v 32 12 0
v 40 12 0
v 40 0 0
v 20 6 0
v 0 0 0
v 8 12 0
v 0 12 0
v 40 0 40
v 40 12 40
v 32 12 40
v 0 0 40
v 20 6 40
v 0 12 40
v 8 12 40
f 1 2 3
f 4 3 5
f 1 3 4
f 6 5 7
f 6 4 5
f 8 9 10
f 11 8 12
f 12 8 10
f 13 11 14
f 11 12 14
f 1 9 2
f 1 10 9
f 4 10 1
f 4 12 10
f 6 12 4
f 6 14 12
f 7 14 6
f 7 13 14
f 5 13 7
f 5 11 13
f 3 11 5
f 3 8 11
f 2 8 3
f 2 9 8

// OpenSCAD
$fn = 32;

// ----------------------------------------------------------------------
// V guide rail: vway, 40 mm wide
// ----------------------------------------------------------------------

// --- parameters (mm) ---
rail_w = 40;              // rail width, X
base_t = 12;              // base plate thickness
v_depth = 6;              // V feature depth / height
v_half_w = 12;            // half width of the V at the base face
plate_t = 40;             // rail length, Z (the extrusion height)

profile = [[0, 0], [40, 0], [40, 12], [32, 12], [20, 6], [8, 12], [0, 12]];  // primary outline, 7 points, counter clockwise

// --- the one profile operation ---
linear_extrude(height = plate_t) polygon(points = profile);
